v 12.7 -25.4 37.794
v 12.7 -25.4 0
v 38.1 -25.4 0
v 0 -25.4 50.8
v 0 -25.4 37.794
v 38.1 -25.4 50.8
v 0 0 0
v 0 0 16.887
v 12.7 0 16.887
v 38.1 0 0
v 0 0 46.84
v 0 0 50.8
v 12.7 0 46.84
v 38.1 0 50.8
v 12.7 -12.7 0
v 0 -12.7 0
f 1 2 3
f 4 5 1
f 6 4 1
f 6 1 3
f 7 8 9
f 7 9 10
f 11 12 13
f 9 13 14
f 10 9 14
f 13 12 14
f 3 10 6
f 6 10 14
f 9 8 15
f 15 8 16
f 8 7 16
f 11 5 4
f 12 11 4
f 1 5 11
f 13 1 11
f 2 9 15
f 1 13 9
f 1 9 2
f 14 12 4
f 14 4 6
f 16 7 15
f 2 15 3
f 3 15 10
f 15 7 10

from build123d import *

# Parameters (mm, degrees)
F0_W     = 38.1
F0_H     = 50.8
F1_DEPTH = 25.4
F3_DEPTH = 12.7


# Not quite as in the source:
# - a length typed as a fraction of an inch, garbled in the dataset ("3 / 203.2 mm" for 3/8 in), is restored


with BuildPart() as f1:
    # F0 (on Front) → F1 (new body)
    with BuildSketch(Plane.XZ):
        with Locations((19.05, 25.4)):
            Rectangle(F0_W, F0_H)
    extrude(amount=F1_DEPTH)

    # F2 (on face) → F3 (cut)
    with BuildSketch(Plane(origin=(0, 0, 0), x_dir=(0, -1, 0), z_dir=(-1, 0, 0))):
        Polygon((25.4, 0), (25.4, 37.7936698496), (0, 46.8400232494), (0, 16.886530444), (12.7, 0), align=None)
    extrude(amount=-F3_DEPTH, mode=Mode.SUBTRACT)


solid = f1.part
